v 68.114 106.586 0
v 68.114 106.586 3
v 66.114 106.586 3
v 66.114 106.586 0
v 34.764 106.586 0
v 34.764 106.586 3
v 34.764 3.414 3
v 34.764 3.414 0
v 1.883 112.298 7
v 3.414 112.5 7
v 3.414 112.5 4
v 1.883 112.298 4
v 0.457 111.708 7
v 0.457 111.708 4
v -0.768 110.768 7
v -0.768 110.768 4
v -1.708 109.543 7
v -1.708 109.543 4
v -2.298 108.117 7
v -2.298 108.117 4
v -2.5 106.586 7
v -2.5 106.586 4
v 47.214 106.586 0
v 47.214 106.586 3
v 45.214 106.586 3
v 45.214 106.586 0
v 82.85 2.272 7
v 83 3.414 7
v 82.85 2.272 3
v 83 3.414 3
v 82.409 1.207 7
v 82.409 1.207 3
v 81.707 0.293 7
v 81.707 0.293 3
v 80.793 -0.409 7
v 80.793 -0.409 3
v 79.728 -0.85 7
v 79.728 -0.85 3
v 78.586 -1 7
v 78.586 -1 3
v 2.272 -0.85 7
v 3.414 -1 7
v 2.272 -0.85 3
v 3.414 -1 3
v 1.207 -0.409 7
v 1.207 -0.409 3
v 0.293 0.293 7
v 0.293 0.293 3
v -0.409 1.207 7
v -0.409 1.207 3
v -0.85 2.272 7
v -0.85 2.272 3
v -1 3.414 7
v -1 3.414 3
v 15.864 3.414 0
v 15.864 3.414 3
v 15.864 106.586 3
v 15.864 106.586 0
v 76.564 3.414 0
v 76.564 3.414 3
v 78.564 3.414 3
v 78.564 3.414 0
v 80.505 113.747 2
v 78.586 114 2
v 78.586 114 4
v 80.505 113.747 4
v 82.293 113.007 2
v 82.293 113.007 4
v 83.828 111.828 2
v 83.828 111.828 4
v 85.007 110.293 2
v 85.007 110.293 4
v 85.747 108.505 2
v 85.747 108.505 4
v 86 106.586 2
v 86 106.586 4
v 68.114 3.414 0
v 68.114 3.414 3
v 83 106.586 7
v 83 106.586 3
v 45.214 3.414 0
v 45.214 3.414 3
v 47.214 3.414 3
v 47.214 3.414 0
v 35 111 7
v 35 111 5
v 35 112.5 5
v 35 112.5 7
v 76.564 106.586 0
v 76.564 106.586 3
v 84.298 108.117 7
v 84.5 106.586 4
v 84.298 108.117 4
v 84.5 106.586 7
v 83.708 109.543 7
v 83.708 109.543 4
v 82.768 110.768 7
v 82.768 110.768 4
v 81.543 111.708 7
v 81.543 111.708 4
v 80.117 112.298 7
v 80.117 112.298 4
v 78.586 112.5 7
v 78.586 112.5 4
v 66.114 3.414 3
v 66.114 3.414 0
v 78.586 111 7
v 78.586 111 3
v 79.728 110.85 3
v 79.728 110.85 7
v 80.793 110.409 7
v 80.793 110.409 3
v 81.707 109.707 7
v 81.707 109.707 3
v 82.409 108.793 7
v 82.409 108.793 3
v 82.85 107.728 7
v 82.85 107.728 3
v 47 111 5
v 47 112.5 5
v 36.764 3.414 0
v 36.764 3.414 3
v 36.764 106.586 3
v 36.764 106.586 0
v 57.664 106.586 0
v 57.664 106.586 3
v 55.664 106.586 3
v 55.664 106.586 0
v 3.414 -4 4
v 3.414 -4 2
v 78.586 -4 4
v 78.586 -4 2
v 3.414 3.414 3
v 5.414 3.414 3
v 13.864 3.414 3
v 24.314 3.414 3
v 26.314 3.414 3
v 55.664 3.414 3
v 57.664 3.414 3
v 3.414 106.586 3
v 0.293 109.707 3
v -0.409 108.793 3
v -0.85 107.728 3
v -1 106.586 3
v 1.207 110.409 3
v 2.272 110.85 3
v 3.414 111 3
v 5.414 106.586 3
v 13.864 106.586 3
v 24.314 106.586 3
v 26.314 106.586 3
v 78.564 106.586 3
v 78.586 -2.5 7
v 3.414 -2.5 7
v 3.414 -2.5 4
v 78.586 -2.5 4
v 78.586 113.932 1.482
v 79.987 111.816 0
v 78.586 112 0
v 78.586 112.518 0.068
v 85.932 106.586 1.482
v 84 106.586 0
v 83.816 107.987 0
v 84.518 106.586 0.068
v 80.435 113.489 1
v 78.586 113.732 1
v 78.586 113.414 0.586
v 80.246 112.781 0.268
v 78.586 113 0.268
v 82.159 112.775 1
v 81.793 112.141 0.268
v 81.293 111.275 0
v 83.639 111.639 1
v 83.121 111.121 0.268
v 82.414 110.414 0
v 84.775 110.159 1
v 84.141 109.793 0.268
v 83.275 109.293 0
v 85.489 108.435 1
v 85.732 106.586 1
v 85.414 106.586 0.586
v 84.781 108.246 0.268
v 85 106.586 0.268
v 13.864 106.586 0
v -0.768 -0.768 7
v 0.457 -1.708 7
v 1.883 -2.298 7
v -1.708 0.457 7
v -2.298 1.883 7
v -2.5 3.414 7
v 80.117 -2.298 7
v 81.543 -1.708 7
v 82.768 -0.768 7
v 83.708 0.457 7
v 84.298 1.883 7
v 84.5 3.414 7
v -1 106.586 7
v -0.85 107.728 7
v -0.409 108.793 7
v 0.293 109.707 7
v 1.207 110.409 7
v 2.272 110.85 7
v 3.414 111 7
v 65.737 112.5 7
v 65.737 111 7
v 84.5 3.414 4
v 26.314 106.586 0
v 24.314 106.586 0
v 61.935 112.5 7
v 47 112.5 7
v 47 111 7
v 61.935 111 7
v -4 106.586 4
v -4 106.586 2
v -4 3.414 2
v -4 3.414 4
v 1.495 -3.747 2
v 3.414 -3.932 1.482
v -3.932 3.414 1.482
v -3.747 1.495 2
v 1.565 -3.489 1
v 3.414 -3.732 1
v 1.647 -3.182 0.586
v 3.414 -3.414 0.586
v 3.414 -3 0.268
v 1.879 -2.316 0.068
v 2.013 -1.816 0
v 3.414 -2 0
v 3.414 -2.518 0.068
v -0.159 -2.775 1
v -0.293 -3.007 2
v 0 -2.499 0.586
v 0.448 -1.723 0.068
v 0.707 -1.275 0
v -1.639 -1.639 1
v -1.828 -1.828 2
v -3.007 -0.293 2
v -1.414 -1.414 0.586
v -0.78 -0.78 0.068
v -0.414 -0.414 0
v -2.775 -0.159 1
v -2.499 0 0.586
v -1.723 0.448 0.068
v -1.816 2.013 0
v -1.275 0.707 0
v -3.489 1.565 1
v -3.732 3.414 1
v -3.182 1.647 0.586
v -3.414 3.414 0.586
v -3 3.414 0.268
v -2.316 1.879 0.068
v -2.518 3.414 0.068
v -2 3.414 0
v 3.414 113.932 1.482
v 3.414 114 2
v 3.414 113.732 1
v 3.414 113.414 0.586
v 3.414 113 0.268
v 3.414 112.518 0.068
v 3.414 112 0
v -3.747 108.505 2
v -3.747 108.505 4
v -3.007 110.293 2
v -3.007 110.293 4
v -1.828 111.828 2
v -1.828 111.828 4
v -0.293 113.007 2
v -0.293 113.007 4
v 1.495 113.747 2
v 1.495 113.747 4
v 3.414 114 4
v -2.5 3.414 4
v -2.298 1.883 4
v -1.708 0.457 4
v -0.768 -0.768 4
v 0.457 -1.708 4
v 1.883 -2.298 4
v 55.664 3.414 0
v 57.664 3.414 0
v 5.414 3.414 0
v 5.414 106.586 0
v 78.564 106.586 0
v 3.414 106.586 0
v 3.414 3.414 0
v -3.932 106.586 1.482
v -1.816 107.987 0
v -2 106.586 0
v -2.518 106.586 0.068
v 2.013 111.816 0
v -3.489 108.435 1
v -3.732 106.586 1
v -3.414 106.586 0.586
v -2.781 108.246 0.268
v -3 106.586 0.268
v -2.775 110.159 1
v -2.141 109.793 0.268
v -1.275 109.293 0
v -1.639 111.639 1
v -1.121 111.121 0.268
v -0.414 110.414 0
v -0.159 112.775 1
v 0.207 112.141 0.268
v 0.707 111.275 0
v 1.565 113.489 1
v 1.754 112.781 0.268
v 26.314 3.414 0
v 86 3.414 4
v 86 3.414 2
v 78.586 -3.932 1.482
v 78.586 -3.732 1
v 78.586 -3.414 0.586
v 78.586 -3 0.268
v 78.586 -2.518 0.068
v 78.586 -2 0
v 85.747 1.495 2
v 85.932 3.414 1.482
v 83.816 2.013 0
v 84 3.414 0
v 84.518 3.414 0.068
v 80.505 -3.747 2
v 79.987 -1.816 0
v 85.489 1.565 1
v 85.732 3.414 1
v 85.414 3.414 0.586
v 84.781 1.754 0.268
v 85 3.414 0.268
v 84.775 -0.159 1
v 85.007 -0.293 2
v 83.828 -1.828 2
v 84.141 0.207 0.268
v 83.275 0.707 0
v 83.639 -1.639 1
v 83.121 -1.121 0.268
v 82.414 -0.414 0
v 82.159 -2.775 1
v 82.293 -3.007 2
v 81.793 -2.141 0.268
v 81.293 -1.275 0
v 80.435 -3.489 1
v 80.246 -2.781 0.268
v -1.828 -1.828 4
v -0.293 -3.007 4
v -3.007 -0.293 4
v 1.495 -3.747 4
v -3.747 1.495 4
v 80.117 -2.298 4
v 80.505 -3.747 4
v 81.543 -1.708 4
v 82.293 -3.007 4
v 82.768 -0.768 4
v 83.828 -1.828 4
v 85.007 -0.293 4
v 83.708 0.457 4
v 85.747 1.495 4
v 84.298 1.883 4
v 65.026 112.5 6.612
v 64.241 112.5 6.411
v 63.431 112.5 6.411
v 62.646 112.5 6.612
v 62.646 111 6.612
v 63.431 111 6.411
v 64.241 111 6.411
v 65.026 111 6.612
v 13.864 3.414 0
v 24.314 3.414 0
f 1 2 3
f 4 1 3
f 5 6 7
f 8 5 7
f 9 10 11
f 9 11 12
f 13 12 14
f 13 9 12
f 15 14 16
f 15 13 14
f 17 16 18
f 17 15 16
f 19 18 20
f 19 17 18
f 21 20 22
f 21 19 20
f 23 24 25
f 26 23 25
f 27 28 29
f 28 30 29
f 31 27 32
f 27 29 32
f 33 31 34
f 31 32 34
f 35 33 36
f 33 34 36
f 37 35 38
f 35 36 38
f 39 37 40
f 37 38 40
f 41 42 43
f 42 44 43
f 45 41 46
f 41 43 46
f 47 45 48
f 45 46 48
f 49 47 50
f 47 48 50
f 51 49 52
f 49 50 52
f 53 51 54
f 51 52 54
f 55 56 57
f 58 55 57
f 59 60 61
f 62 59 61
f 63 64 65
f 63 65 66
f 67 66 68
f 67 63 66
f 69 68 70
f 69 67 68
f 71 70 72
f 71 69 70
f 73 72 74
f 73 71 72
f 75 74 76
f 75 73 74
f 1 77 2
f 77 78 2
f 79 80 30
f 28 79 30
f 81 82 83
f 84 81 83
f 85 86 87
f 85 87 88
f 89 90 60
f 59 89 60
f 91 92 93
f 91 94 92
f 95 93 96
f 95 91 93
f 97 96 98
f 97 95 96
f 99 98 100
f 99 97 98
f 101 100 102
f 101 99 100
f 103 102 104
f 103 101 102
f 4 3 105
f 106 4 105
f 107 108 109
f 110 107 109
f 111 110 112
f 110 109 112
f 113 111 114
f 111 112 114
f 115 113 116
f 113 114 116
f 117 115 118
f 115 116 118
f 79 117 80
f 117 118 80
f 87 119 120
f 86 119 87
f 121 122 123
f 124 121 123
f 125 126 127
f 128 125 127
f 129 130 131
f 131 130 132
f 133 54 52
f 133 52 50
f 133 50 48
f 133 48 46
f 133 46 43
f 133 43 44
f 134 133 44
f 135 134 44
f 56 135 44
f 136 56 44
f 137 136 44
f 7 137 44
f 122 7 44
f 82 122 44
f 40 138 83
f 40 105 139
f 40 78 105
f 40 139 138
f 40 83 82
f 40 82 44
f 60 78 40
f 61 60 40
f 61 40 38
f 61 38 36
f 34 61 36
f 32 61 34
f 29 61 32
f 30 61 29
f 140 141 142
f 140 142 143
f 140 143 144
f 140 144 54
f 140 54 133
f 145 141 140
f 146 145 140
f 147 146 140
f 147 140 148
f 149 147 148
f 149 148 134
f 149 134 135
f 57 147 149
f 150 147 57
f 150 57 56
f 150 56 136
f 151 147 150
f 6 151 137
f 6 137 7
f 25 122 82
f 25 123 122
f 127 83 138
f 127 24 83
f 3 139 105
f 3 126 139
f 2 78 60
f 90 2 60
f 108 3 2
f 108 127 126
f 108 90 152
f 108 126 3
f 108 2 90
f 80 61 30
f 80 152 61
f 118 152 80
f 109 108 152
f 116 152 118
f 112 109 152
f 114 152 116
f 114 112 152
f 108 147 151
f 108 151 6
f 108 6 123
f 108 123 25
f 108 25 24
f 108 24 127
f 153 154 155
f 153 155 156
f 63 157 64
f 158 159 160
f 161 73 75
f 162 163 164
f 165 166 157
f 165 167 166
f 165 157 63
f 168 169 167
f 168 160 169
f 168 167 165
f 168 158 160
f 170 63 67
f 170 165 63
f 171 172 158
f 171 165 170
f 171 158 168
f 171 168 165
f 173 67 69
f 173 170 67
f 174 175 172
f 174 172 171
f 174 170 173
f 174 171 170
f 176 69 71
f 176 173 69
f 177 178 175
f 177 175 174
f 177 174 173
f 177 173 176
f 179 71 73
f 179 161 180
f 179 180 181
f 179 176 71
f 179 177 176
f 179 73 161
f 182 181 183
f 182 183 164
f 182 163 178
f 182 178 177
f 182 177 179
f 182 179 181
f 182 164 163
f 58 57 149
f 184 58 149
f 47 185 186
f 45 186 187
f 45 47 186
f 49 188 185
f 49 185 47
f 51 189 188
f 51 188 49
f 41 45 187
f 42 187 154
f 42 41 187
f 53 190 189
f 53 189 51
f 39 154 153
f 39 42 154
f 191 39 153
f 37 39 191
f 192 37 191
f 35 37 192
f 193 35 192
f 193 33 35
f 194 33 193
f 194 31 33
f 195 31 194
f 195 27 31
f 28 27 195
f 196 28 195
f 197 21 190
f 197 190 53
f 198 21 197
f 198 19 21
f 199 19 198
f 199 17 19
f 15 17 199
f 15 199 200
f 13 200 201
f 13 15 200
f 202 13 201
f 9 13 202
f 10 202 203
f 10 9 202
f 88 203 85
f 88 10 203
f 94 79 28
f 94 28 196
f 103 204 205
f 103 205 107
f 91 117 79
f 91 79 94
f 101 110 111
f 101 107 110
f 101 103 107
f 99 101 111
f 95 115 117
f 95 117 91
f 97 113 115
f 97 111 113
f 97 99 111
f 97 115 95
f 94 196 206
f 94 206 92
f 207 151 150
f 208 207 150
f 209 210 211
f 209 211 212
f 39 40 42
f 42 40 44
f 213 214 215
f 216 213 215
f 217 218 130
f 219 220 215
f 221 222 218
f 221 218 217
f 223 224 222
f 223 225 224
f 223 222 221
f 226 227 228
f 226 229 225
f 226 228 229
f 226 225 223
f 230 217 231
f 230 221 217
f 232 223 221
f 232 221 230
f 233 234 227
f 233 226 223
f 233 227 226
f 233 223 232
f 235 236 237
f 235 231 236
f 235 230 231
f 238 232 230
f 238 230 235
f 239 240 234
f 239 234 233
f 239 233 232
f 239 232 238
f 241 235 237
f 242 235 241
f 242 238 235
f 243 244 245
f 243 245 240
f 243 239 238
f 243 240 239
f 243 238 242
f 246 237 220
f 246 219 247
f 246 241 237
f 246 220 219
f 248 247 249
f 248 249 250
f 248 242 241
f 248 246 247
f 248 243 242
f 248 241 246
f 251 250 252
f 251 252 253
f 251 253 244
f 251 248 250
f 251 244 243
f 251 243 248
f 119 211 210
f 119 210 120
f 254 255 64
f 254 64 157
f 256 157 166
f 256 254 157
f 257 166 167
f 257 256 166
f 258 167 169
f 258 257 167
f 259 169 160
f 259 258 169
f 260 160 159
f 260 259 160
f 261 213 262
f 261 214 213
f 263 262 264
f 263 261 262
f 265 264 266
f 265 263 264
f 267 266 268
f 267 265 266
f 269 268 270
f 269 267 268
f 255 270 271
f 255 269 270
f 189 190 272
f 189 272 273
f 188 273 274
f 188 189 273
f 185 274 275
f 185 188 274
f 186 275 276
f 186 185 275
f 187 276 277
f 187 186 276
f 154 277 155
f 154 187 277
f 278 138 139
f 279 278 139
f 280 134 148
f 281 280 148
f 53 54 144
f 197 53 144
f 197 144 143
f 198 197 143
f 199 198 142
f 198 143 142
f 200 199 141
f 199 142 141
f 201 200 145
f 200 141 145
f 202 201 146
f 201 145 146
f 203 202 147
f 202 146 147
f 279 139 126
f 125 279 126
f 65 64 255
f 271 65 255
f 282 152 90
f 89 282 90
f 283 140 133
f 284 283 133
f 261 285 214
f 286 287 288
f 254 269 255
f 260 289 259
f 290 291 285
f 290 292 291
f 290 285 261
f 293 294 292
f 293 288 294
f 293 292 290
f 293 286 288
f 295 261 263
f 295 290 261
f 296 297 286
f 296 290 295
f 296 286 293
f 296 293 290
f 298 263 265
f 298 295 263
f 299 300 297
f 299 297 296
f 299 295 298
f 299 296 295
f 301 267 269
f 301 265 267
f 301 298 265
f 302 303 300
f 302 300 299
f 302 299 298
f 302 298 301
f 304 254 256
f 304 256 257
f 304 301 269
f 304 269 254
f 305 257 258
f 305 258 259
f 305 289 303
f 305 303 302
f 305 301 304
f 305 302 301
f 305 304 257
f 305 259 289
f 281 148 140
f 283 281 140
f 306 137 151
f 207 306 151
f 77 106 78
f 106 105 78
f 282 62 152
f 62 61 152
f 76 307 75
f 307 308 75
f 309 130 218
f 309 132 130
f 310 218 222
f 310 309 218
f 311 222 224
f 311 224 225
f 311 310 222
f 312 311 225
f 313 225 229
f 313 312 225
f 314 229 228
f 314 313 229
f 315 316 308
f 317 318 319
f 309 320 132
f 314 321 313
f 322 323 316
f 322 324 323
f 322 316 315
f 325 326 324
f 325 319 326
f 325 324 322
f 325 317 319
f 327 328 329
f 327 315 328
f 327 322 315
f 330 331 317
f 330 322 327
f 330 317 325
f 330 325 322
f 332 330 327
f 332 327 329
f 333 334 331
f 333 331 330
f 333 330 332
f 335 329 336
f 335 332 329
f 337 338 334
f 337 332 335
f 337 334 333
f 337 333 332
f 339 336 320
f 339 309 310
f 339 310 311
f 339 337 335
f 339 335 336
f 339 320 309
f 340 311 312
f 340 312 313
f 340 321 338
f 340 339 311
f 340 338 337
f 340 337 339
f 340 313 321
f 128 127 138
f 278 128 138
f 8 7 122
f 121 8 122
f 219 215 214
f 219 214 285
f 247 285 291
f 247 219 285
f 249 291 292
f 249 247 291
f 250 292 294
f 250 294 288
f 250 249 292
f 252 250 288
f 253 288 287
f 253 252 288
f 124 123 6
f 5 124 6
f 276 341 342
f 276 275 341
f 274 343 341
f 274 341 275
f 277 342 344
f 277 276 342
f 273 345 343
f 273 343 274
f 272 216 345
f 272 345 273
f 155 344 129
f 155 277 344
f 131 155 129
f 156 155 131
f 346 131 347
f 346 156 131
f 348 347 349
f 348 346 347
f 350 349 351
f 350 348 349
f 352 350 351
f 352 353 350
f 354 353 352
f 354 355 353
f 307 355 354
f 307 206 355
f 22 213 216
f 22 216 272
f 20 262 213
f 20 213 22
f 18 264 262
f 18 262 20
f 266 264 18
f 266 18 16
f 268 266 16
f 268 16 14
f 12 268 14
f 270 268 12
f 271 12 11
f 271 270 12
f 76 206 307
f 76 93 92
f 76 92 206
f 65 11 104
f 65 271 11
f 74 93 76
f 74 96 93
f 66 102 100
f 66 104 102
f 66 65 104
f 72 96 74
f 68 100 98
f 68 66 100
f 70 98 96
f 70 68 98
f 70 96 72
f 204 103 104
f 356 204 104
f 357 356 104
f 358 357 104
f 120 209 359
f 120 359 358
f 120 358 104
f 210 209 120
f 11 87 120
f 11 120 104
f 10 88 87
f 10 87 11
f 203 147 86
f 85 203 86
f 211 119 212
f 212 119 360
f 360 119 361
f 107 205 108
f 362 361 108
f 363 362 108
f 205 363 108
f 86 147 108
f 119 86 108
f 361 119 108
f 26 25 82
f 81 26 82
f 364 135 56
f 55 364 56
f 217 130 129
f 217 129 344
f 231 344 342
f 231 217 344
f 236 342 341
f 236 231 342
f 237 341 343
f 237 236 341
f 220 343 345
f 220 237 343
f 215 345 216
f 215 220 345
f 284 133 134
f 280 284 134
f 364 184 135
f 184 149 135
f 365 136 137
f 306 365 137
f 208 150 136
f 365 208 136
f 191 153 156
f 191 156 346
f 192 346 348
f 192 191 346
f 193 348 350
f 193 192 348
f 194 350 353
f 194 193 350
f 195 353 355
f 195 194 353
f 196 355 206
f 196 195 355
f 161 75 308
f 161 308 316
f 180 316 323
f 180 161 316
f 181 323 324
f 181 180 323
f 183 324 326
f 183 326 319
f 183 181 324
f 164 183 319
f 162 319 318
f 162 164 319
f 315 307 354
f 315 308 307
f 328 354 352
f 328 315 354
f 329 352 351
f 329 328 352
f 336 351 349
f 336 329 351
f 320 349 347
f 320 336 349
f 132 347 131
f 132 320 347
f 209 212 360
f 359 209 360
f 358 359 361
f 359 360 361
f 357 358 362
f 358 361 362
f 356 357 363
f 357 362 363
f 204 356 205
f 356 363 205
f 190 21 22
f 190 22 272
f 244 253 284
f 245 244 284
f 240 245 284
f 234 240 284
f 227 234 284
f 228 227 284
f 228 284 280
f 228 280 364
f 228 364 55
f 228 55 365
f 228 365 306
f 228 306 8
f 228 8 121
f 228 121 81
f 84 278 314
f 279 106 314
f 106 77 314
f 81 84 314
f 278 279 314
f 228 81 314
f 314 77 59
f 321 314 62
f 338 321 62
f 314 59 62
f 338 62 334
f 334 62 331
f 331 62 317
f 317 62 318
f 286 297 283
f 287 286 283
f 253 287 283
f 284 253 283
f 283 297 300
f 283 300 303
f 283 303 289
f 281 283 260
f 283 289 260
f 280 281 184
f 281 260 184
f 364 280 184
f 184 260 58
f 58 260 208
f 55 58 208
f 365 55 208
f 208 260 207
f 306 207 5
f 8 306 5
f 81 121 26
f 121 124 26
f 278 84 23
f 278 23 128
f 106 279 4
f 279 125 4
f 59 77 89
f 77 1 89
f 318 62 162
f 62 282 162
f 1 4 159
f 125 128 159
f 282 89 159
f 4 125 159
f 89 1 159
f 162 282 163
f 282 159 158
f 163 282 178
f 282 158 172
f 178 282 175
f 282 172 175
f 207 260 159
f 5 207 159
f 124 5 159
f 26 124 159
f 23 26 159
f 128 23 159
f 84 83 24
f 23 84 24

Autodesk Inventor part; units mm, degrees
ref_plane "YZ Plane" through (0, 0, 0) normal (1, 0, 0) x (0, 1, 0)
ref_plane "XZ Plane" through (0, 0, 0) normal (0, 1, 0) x (-1, 0, 0)
ref_plane "XY Plane" through (0, 0, 0) normal (0, 0, 1) x (1, 0, 0)
sketch "Sketch6" plane through (0, 0, 0) normal (0, 0, 1) x (1, 0, 0)
  arc A0 (83, 106.5858) -> (78.5858, 111) centre (78.5858, 106.5858) ccw
  line L0 (83, 106.5858) -> (83, 3.4142)
  arc A1 (78.5858, -1) -> (83, 3.4142) centre (78.5858, 3.4142) ccw
  line L1 (78.5858, -1) -> (3.4142, -1)
  arc A2 (-1, 3.4142) -> (3.4142, -1) centre (3.4142, 3.4142) ccw
  line L2 (-1, 3.4142) -> (-1, 106.5858)
  arc A3 (3.4142, 111) -> (-1, 106.5858) centre (3.4142, 106.5858) ccw
  line L3 (3.4142, 111) -> (78.5858, 111)
  arc A4 (86, 106.5858) -> (78.5858, 114) centre (78.5858, 106.5858) ccw
  line L4 (86, 106.5858) -> (86, 3.4142)
  arc A5 (78.5858, -4) -> (86, 3.4142) centre (78.5858, 3.4142) ccw
  line L5 (78.5858, -4) -> (3.4142, -4)
  arc A6 (-4, 3.4142) -> (3.4142, -4) centre (3.4142, 3.4142) ccw
  line L6 (-4, 3.4142) -> (-4, 106.5858)
  arc A7 (3.4142, 114) -> (-4, 106.5858) centre (3.4142, 106.5858) ccw
  line L7 (3.4142, 114) -> (78.5858, 114)
extrude "Extrusion4" add sketch "Sketch6" along normal blind 3 contours L0 A1 L1 A2 L2 A3 L3 A0 | L4 A5 L5 A6 L6 A7 L7 A4
sketch "Sketch7" plane through (0, 0, 3) normal (0, 0, 1) x (1, 0, 0)
  line L0 (83, 106.5858) -> (83, 3.4142)
  line L1 (-1, 3.4142) -> (-1, 106.5858)
  arc A0 (78.5858, -1) -> (83, 3.4142) centre (78.5858, 3.4142) ccw
  arc A1 (-1, 3.4142) -> (3.4142, -1) centre (3.4142, 3.4142) ccw
  line L2 (78.5858, -1) -> (3.4142, -1)
  line L3 (3.4142, 111) -> (78.5858, 111)
  arc A2 (3.4142, 111) -> (-1, 106.5858) centre (3.4142, 106.5858) ccw
  arc A3 (83, 106.5858) -> (78.5858, 111) centre (78.5858, 106.5858) ccw
  line L4 (-4, 106.5858) -> (-4, 3.4142)
  arc A4 (-4, 3.4142) -> (3.4142, -4) centre (3.4142, 3.4142) ccw
  line L5 (3.4142, -4) -> (78.5858, -4)
  arc A5 (78.5858, -4) -> (86, 3.4142) centre (78.5858, 3.4142) ccw
  line L6 (86, 3.4142) -> (86, 106.5858)
  arc A6 (86, 106.5858) -> (78.5858, 114) centre (78.5858, 106.5858) ccw
  line L7 (78.5858, 114) -> (3.4142, 114)
  arc A7 (3.4142, 114) -> (-4, 106.5858) centre (3.4142, 106.5858) ccw
  point P0 (0, 0)
  dimension "d17" = 3
extrude "Extrusion5" add sketch "Sketch7" along normal blind 4
sketch "Sketch8" plane through (0, 0, 7) normal (0, 0, 1) x (1, 0, 0)
  arc A0 (3.4142, 111) -> (-1, 106.5858) centre (3.4142, 106.5858) ccw
  line L0 (3.4142, 111) -> (78.5858, 111)
  arc A1 (83, 106.5858) -> (78.5858, 111) centre (78.5858, 106.5858) ccw
  line L1 (-1, 3.4142) -> (-1, 106.5858)
  line L2 (83, 106.5858) -> (83, 3.4142)
  arc A2 (-1, 3.4142) -> (3.4142, -1) centre (3.4142, 3.4142) ccw
  line L3 (78.5858, -1) -> (3.4142, -1)
  arc A3 (78.5858, -1) -> (83, 3.4142) centre (78.5858, 3.4142) ccw
  line L4 (-4, 106.5858) -> (-4, 3.4142)
  arc A4 (-4, 3.4142) -> (3.4142, -4) centre (3.4142, 3.4142) ccw
  line L5 (3.4142, -4) -> (78.5858, -4)
  arc A5 (78.5858, -4) -> (86, 3.4142) centre (78.5858, 3.4142) ccw
  line L6 (86, 3.4142) -> (86, 106.5858)
  arc A6 (86, 106.5858) -> (78.5858, 114) centre (78.5858, 106.5858) ccw
  line L7 (78.5858, 114) -> (3.4142, 114)
  arc A7 (3.4142, 114) -> (-4, 106.5858) centre (3.4142, 106.5858) ccw
  line L8 (-2.5, 106.5858) -> (-2.5, 3.4142)
  arc A8 (-2.5, 3.4142) -> (3.4142, -2.5) centre (3.4142, 3.4142) ccw
  line L9 (3.4142, -2.5) -> (78.5858, -2.5)
  arc A9 (78.5858, -2.5) -> (84.5, 3.4142) centre (78.5858, 3.4142) ccw
  line L10 (84.5, 3.4142) -> (84.5, 106.5858)
  arc A10 (84.5, 106.5858) -> (78.5858, 112.5) centre (78.5858, 106.5858) ccw
  line L11 (78.5858, 112.5) -> (3.4142, 112.5)
  arc A11 (3.4142, 112.5) -> (-2.5, 106.5858) centre (3.4142, 106.5858) ccw
  point P0 (0, 0)
  point P1 (0, 0)
  dimension "d20" = 3
  dimension "d21" = 1.5
extrude "Extrusion6" cut sketch "Sketch8" against normal blind 3 contours A7 L7 A6 L6 A5 L5 A4 L4
fillet "Fillet2" radius 2 8 edges at (-1.8284, 111.8284, 0) (-4, 55, 0) (-1.8284, -1.8284, 0) (41, -4, 0) (83.8284, -1.8284, 0) (86, 55, 0) (83.8284, 111.8284, 0) (41, 114, 0)
sketch "Sketch9" plane through (3.4142, 111, 3) normal (0, -1, 0) x (1, 0, 0)
  circle A0 centre (60.4216, 6.636) radius 3.25
  line L0 (31.5858, 6) -> (43.5858, 6)
  line L1 (43.5858, 6) -> (43.5858, 2)
  line L2 (43.5858, 2) -> (31.5858, 2)
  line L3 (31.5858, 2) -> (31.5858, 6)
  line L4 (31.5858, 6) -> (43.5858, 2) construction
  line L5 (43.5858, 6) -> (31.5858, 2) construction
  point P0 (37.5858, 4)
  dimension "d55" = 12
  dimension "d56" = 4
extrude "Extrusion7" cut sketch "Sketch9" against normal blind 3
sketch "Sketch11" plane through (0, 0, 3) normal (0, 0, 1) x (1, 0, 0)
  line L0 (3.4142, 3.4142) -> (5.4142, 3.4142)
  line L1 (5.4142, 3.4142) -> (5.4142, 106.5858)
  line L2 (5.4142, 106.5858) -> (3.4142, 106.5858)
  line L3 (3.4142, 106.5858) -> (3.4142, 3.4142)
  line L4 (13.8642, 3.4142) -> (15.8642, 3.4142)
  line L5 (15.8642, 3.4142) -> (15.8642, 106.5858)
  line L6 (15.8642, 106.5858) -> (13.8642, 106.5858)
  line L7 (13.8642, 106.5858) -> (13.8642, 3.4142)
  line L8 (24.3142, 3.4142) -> (26.3142, 3.4142)
  line L9 (26.3142, 3.4142) -> (26.3142, 106.5858)
  line L10 (26.3142, 106.5858) -> (24.3142, 106.5858)
  line L11 (24.3142, 106.5858) -> (24.3142, 3.4142)
  line L12 (34.7642, 3.4142) -> (36.7642, 3.4142)
  line L13 (36.7642, 3.4142) -> (36.7642, 106.5858)
  line L14 (36.7642, 106.5858) -> (34.7642, 106.5858)
  line L15 (34.7642, 106.5858) -> (34.7642, 3.4142)
  line L16 (45.2142, 3.4142) -> (47.2142, 3.4142)
  line L17 (47.2142, 3.4142) -> (47.2142, 106.5858)
  line L18 (47.2142, 106.5858) -> (45.2142, 106.5858)
  line L19 (45.2142, 106.5858) -> (45.2142, 3.4142)
  line L20 (55.6642, 3.4142) -> (57.6642, 3.4142)
  line L21 (57.6642, 3.4142) -> (57.6642, 106.5858)
  line L22 (57.6642, 106.5858) -> (55.6642, 106.5858)
  line L23 (55.6642, 106.5858) -> (55.6642, 3.4142)
  line L24 (66.1142, 3.4142) -> (68.1142, 3.4142)
  line L25 (68.1142, 3.4142) -> (68.1142, 106.5858)
  line L26 (68.1142, 106.5858) -> (66.1142, 106.5858)
  line L27 (66.1142, 106.5858) -> (66.1142, 3.4142)
  line L28 (76.5642, 3.4142) -> (78.5642, 3.4142)
  line L29 (78.5642, 3.4142) -> (78.5642, 106.5858)
  line L30 (78.5642, 106.5858) -> (76.5642, 106.5858)
  line L31 (76.5642, 106.5858) -> (76.5642, 3.4142)
  dimension "d57" = 2
  dimension "d60" = 10.45
extrude "Extrusion9" cut sketch "Sketch11" against normal blind 3
properties part number "CaseGroboyBack"
